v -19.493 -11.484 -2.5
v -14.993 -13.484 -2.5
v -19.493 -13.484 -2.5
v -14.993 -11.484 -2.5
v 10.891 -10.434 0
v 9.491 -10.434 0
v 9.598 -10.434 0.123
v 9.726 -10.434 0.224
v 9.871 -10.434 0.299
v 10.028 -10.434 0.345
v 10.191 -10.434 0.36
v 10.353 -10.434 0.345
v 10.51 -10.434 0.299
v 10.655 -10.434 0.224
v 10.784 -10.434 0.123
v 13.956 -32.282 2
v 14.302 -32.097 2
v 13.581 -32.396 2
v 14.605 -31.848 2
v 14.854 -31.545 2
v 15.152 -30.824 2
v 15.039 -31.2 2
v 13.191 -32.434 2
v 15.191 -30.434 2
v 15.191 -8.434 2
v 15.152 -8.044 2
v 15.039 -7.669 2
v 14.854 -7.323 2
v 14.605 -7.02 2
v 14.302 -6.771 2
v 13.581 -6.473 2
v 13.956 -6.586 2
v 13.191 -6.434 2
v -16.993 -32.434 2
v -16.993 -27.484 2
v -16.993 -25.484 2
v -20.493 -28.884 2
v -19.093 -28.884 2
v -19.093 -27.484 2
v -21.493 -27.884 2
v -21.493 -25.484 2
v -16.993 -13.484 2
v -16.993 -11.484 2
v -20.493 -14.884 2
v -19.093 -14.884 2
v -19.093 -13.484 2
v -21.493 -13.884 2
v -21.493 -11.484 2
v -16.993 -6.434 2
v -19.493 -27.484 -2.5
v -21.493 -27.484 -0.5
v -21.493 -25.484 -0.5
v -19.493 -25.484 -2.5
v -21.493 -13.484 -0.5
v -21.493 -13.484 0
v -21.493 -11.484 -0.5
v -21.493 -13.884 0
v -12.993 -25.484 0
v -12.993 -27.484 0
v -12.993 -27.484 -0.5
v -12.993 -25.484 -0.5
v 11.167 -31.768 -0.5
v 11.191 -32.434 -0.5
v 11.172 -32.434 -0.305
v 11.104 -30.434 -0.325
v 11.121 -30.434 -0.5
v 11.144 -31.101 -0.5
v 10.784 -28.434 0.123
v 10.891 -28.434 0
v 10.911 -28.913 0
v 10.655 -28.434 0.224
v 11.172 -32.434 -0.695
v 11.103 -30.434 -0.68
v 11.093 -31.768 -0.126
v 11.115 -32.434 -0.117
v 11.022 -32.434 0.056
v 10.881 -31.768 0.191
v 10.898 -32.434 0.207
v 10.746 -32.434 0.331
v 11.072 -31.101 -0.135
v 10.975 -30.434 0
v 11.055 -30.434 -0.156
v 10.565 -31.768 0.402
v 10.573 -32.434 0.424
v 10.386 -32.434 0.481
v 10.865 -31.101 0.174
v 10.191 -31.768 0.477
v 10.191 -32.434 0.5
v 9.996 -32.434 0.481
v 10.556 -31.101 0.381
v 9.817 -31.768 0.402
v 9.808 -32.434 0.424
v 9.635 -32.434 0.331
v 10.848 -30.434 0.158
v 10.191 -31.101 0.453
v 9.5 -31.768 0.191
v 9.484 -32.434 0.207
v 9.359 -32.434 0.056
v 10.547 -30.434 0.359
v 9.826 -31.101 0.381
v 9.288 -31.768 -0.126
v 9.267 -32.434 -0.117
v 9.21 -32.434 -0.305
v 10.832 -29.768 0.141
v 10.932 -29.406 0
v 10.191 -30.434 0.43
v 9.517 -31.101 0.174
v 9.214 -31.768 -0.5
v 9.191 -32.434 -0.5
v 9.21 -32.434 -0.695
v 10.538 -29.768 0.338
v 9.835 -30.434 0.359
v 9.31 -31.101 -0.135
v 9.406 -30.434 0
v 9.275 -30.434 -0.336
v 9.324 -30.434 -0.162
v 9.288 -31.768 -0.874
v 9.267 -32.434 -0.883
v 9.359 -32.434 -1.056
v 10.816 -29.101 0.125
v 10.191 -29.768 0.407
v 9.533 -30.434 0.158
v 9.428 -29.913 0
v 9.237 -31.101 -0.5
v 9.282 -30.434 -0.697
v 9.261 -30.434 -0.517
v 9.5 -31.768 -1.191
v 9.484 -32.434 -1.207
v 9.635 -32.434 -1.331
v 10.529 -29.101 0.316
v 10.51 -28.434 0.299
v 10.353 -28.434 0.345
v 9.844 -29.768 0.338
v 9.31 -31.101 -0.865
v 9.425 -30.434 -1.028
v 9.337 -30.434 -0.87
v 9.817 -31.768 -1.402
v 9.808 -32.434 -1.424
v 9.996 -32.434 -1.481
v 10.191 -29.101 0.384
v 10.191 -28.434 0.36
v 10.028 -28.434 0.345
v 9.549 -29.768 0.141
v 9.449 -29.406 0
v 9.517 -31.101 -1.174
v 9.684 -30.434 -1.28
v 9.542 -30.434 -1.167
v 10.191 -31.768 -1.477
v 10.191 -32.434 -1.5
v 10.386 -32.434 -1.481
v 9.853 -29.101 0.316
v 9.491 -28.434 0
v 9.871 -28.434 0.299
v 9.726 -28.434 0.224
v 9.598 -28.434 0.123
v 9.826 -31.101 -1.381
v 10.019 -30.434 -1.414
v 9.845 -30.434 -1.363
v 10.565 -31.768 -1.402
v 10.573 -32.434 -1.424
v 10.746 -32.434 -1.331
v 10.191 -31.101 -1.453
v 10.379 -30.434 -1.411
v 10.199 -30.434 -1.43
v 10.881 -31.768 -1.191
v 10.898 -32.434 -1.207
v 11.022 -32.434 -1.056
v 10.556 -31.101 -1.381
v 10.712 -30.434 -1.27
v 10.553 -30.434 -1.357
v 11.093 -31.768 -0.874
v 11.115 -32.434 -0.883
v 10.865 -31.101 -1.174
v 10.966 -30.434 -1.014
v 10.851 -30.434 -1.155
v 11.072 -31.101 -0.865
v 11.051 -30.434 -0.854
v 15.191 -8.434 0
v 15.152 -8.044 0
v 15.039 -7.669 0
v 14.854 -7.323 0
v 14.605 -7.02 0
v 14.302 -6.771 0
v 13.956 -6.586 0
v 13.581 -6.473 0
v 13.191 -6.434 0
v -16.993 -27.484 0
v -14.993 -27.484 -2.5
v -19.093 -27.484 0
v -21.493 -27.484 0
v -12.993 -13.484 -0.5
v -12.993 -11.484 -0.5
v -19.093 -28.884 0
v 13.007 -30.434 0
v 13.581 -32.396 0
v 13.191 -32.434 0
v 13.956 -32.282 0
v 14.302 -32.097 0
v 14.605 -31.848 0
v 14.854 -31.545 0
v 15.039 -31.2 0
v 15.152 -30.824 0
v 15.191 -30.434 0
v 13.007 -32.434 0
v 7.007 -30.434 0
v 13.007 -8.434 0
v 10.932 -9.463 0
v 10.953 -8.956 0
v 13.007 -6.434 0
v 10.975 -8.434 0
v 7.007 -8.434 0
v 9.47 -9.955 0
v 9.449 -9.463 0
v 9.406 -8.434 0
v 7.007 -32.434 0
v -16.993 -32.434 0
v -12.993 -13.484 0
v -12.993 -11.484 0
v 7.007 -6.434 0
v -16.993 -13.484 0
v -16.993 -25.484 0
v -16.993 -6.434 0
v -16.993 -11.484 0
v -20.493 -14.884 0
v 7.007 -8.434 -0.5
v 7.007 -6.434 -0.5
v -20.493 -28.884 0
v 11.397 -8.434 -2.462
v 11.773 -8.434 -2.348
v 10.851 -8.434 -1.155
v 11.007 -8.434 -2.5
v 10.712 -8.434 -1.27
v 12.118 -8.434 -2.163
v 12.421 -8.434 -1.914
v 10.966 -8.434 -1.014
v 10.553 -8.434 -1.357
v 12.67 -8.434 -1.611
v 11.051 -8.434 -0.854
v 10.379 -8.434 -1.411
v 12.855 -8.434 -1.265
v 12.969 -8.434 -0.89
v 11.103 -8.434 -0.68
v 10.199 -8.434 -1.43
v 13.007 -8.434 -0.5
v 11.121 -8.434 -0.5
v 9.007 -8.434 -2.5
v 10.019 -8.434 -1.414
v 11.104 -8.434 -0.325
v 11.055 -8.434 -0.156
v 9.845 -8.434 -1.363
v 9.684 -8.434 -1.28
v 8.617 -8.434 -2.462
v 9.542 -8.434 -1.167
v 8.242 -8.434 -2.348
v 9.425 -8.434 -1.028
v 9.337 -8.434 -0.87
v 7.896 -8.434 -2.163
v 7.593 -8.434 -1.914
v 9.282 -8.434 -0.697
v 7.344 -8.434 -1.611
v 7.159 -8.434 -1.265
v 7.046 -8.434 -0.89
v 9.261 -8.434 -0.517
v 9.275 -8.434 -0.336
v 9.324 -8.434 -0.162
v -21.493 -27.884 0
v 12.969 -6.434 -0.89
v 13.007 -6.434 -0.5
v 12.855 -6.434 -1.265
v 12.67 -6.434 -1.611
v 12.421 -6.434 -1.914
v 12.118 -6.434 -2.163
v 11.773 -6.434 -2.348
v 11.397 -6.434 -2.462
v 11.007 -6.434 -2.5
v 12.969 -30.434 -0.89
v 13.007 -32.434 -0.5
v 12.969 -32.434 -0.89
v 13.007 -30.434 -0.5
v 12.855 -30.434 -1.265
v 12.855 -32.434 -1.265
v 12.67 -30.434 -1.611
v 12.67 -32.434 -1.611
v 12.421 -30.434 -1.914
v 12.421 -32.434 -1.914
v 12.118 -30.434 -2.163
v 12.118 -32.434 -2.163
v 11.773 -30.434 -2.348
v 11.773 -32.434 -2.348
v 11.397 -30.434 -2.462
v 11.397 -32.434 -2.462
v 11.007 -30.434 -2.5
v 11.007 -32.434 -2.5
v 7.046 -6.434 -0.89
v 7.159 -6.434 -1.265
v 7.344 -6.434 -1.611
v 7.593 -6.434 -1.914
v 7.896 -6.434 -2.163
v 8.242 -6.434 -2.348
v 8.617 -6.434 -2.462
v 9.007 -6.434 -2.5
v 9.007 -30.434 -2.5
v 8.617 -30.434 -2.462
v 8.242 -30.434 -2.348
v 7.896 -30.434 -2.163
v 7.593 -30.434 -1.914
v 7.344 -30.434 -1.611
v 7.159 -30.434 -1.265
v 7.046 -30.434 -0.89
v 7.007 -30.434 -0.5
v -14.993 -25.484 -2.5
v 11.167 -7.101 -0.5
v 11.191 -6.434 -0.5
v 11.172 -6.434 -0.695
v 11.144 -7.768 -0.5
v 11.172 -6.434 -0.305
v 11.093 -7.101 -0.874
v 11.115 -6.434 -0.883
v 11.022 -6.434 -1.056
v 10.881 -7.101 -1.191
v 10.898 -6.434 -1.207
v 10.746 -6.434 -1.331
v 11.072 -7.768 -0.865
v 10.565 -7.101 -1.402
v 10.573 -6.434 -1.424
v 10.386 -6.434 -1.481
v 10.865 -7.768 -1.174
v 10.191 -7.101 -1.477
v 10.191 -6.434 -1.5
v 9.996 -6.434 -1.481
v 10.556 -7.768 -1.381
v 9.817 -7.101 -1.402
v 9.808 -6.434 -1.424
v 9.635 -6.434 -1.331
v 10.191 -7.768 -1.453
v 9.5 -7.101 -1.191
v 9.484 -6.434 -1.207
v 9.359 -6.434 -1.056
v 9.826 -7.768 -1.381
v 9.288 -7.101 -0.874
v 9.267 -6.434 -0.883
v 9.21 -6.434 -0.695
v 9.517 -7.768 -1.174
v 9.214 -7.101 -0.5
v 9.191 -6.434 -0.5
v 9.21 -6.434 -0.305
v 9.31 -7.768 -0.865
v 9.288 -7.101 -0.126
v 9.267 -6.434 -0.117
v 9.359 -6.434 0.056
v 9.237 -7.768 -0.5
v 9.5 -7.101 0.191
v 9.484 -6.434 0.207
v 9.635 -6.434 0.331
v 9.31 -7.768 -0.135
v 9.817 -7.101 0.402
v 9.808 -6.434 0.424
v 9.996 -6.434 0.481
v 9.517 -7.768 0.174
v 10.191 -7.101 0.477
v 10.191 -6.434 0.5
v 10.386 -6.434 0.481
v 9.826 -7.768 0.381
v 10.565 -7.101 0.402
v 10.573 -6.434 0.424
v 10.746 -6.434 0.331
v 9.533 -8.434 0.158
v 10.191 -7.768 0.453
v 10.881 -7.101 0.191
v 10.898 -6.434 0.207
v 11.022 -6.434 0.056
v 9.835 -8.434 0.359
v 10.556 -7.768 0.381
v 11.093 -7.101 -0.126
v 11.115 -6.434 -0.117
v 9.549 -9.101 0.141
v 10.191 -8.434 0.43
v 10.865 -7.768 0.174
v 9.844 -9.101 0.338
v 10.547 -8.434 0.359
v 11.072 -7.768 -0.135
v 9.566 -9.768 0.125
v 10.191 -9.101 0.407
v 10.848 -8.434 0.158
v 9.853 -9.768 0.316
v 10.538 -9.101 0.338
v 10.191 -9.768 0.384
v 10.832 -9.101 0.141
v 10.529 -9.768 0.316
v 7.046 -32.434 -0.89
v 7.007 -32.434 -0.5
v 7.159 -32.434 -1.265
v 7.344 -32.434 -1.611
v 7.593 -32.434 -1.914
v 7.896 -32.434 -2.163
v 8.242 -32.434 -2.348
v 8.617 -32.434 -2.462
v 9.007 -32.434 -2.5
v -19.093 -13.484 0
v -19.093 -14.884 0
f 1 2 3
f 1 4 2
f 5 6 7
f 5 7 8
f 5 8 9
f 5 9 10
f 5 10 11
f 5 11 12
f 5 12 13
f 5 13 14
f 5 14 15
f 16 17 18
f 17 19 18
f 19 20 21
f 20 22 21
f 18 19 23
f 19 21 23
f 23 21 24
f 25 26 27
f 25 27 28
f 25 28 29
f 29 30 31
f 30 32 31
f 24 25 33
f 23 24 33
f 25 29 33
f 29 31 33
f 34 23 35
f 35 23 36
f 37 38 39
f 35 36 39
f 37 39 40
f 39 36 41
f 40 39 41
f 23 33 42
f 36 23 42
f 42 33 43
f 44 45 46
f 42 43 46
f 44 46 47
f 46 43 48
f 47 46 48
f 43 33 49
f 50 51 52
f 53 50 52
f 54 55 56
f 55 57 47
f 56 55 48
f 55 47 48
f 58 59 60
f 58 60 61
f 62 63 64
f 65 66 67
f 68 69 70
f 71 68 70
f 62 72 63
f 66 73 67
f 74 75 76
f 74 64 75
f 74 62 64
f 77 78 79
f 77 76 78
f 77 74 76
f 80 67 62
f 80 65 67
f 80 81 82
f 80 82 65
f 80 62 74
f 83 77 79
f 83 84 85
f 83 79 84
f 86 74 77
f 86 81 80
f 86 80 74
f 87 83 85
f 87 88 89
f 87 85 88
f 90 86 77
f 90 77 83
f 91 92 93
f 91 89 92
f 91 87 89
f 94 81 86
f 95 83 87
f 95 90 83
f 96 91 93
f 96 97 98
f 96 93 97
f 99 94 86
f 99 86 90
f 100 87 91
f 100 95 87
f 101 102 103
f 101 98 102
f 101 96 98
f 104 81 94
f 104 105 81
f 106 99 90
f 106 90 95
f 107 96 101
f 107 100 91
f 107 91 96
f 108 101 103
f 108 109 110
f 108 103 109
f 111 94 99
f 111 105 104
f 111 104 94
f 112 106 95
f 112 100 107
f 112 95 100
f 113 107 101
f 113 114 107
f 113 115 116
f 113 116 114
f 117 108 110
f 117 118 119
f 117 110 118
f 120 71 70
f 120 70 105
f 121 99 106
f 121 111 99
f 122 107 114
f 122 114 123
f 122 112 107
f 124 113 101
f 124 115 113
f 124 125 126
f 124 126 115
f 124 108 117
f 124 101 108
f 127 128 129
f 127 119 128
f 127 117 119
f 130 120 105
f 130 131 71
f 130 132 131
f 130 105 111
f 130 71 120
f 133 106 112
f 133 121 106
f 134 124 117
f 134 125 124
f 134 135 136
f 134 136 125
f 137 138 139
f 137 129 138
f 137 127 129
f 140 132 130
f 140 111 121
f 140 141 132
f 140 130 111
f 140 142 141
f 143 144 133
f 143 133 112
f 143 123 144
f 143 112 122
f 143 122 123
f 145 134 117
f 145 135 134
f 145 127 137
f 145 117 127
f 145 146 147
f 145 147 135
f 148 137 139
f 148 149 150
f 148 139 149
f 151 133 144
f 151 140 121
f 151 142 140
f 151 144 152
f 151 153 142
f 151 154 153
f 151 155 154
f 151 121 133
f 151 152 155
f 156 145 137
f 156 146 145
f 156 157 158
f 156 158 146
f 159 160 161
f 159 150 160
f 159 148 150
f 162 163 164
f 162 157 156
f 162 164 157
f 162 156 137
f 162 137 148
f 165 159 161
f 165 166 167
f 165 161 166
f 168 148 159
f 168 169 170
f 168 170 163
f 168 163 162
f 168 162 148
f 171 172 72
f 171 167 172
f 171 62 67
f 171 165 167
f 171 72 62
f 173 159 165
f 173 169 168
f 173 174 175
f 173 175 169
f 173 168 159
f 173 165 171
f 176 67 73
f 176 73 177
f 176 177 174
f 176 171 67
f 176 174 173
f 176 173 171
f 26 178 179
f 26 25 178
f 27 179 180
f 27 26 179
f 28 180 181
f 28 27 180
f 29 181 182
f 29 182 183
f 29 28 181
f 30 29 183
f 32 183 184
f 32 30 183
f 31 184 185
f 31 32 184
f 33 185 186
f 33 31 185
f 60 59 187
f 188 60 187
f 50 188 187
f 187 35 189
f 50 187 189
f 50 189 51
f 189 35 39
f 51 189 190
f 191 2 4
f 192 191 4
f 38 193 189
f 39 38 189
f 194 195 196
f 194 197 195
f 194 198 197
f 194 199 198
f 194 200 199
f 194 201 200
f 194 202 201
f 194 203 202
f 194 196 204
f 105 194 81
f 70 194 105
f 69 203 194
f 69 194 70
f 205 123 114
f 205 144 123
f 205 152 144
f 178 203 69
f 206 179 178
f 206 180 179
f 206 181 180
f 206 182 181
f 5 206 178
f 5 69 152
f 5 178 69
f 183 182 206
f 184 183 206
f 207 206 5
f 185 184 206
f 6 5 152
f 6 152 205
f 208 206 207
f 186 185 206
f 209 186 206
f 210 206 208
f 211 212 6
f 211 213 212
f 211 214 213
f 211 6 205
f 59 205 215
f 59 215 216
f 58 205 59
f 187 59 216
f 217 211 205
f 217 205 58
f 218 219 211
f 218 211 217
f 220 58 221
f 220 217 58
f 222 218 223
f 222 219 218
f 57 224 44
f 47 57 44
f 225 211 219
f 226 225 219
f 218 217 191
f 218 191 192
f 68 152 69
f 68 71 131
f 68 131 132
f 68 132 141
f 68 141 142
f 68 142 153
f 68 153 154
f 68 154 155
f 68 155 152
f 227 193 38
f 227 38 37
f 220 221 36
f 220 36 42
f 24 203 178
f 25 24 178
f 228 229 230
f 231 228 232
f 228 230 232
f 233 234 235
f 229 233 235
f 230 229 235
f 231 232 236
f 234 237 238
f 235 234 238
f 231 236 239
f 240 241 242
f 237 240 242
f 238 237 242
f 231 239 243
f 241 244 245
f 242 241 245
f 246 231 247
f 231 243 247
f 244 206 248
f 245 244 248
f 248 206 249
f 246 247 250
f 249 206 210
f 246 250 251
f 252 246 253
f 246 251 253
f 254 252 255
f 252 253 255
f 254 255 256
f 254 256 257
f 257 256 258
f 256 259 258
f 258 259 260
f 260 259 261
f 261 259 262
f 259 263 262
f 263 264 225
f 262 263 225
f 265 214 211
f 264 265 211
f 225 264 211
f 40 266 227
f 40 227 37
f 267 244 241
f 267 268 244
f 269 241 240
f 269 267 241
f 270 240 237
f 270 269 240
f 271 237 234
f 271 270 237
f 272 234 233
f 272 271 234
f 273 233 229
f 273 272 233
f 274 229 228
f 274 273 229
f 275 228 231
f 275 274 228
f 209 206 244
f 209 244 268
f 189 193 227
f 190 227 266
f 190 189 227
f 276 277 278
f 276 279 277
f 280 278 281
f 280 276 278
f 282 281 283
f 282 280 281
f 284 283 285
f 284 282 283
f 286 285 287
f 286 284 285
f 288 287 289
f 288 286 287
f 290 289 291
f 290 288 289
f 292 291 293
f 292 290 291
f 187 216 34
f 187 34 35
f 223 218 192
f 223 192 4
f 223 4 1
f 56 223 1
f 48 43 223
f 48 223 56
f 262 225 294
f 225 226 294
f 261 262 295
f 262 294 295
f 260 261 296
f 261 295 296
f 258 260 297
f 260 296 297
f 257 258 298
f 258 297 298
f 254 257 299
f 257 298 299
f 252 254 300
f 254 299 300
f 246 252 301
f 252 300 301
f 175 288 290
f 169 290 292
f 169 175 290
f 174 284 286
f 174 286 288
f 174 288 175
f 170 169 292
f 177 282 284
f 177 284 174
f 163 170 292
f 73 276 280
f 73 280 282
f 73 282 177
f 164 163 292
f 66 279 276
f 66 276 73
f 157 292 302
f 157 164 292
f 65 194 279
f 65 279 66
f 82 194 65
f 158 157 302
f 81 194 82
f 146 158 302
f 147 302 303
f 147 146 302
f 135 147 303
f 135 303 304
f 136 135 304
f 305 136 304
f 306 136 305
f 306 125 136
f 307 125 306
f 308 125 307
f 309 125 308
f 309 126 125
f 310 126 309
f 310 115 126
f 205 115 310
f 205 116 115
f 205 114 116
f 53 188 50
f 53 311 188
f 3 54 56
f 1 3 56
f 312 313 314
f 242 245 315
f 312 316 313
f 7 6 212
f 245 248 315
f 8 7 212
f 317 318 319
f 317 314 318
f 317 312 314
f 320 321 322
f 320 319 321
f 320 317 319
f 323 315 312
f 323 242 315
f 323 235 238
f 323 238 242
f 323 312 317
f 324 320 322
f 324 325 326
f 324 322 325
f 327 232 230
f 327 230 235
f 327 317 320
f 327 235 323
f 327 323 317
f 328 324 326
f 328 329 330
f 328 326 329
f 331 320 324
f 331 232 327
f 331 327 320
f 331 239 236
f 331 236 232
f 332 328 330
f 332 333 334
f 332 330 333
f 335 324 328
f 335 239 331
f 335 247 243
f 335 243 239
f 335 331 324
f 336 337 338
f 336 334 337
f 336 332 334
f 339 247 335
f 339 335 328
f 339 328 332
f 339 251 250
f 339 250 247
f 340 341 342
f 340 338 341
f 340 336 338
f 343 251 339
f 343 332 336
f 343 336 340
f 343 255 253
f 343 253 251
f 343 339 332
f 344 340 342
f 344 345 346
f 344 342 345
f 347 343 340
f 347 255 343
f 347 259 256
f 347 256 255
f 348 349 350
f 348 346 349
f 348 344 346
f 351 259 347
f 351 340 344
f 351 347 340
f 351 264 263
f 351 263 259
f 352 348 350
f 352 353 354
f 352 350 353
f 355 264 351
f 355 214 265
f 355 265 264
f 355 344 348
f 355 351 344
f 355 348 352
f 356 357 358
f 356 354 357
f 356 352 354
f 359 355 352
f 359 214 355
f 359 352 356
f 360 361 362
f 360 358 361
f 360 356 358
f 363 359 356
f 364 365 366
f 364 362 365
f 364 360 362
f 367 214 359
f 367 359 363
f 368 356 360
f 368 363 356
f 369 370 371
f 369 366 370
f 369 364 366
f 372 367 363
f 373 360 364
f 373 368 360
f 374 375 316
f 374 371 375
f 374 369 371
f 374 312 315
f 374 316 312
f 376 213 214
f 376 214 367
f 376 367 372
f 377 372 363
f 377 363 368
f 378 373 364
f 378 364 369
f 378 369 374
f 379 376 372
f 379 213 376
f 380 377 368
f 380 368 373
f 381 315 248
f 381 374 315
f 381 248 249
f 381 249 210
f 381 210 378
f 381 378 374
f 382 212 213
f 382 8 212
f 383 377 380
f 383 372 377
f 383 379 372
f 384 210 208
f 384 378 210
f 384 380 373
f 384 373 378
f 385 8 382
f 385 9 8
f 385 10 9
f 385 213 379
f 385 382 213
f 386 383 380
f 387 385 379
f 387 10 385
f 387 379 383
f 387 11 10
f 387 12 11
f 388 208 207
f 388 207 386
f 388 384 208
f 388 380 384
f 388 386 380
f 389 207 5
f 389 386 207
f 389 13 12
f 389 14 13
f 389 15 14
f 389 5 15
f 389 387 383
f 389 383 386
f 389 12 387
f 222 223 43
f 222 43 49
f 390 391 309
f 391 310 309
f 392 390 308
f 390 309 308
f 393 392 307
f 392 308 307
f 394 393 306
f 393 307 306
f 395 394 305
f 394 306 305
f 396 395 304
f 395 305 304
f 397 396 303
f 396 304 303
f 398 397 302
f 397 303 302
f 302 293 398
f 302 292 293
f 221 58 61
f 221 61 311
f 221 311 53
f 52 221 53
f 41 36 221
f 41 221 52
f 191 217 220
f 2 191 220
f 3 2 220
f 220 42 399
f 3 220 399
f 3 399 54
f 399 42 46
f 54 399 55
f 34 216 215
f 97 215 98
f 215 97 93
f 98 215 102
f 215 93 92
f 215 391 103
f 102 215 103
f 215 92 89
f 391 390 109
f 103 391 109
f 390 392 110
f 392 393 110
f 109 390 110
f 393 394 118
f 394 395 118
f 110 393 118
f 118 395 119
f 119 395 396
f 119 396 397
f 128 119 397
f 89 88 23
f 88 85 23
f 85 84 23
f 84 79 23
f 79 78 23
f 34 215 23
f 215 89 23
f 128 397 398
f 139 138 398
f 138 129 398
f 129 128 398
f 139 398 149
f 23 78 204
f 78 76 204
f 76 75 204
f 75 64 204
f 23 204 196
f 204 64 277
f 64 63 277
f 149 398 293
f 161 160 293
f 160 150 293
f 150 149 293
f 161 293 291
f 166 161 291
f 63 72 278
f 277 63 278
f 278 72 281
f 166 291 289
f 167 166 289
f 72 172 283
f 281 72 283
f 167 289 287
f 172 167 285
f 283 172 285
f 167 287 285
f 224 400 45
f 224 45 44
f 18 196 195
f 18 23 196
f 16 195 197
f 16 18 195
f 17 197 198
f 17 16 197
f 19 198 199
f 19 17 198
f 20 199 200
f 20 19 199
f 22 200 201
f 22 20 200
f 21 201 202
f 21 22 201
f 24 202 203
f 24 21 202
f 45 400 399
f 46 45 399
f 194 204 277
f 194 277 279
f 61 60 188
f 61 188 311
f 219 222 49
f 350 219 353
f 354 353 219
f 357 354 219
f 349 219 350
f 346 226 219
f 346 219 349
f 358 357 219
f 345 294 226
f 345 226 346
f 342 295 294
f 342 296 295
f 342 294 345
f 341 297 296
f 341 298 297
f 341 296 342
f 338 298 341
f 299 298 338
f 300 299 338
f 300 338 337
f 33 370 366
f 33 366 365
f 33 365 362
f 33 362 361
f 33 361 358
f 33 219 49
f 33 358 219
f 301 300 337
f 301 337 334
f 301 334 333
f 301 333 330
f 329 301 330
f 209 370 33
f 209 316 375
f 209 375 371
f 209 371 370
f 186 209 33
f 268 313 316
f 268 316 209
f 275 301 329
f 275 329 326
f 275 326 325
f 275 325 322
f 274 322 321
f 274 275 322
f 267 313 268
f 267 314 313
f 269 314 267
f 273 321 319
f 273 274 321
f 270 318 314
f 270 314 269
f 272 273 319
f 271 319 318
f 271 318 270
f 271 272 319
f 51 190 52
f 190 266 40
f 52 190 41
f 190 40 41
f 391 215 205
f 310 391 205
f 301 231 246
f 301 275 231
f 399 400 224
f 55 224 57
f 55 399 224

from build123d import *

# Parameters (mm, degrees)
SKETCH_2_W          = 32.183544672
SKETCH_2_H          = 26
EXTRUDE_1_DEPTH     = 2
FILLET_1_R          = 2
SKETCH_5_W          = 6
SKETCH_5_H          = 2
EXTRUDE_2_DEPTH     = 2.5
FILLET_2_R          = 2
SKETCH_6_R          = 1
CUT_EXTRUDE_3_DEPTH = 4
CUT_EXTRUDE_3_TAPER = 2
SKETCH_7_R          = 1
CUT_EXTRUDE_4_DEPTH = 4
CUT_EXTRUDE_4_TAPER = 2
SKETCH_8_W          = 4.5
SKETCH_8_H          = 2
EXTRUDE_3_DEPTH     = 2
SKETCH_10_W         = 2.4
SKETCH_10_H         = 1.4
EXTRUDE_4_DEPTH     = 2
EXTRUDE_4_2_DEPTH   = 2
SKETCH_11_W         = 8.5
SKETCH_11_H         = 2
EXTRUDE_5_DEPTH     = 2.5
CHAMFER_1_SIZE      = 2
CHAMFER_2_SIZE      = 1


with BuildPart() as part:
    # 草图2 → 凸台-拉伸1 (new body)
    with BuildSketch(Plane.XY):
        with Locations((-0.901029093, -19.434236018)):
            Rectangle(SKETCH_2_W, SKETCH_2_H)
    extrude(amount=EXTRUDE_1_DEPTH)

    # 圆角1
    fillet_1_edges = [part.edges().sort_by_distance(p)[0] for p in [
        (15.190743243, -32.434236018, 1),
        (15.190743243, -6.434236018, 1),
    ]]
    fillet(fillet_1_edges, radius=FILLET_1_R)

    # 草图5 → 凸台-拉伸2 (add)
    with BuildSketch(Plane(origin=(0, 0, 0), x_dir=(-1, 0, 0), z_dir=(0, 0, -1))):
        with Locations((-10.007198571, -7.434236018)):
            Rectangle(SKETCH_5_W, SKETCH_5_H)
        with Locations((-10.007198571, -31.434236018)):
            Rectangle(SKETCH_5_W, SKETCH_5_H)
    extrude(amount=EXTRUDE_2_DEPTH)

    # 圆角2
    fillet_2_edges = [part.edges().sort_by_distance(p)[0] for p in [
        (13.007198571, -7.434236018, -2.5),
        (7.007198571, -7.434236018, -2.5),
        (13.007198571, -31.434236018, -2.5),
        (7.007198571, -31.434236018, -2.5),
    ]]
    fillet(fillet_2_edges, radius=FILLET_2_R)

    # 草图6 → 切除-拉伸3 (cut)
    with BuildSketch(Plane.XZ.offset(32.434236018)):
        with Locations((10.190743244, -0.5)):
            Circle(SKETCH_6_R)
    extrude(amount=-CUT_EXTRUDE_3_DEPTH, taper=CUT_EXTRUDE_3_TAPER, mode=Mode.SUBTRACT)

    # 草图7 → 切除-拉伸4 (cut)
    with BuildSketch(Plane(origin=(0, -6.434236018, 0), x_dir=(1, 0, 0), z_dir=(0, 1, 0))):
        with Locations((10.190743243, 0.5)):
            Circle(SKETCH_7_R)
    extrude(amount=-CUT_EXTRUDE_4_DEPTH, taper=CUT_EXTRUDE_4_TAPER, mode=Mode.SUBTRACT)

    # 草图8 → 凸台-拉伸3 (add)
    with BuildSketch(Plane(origin=(0, 0, 0), x_dir=(-1, 0, 0), z_dir=(0, 0, -1))):
        with Locations((19.242801429, -12.484236018)):
            Rectangle(SKETCH_8_W, SKETCH_8_H)
        with Locations((19.242801429, -26.484236018)):
            Rectangle(SKETCH_8_W, SKETCH_8_H)
    extrude(amount=-EXTRUDE_3_DEPTH)



with BuildPart() as body_2:
    # 草图10 → 凸台-拉伸4 (new body)
    with BuildSketch(Plane(origin=(0, 0, 0), x_dir=(-1, 0, 0), z_dir=(0, 0, -1))):
        with Locations((20.292801429, -14.184236018)):
            Rectangle(SKETCH_10_W, SKETCH_10_H)
    extrude(amount=-EXTRUDE_4_DEPTH)


with BuildPart() as body_3:
    # 草图10 → Extrude 4 2 (new body)
    with BuildSketch(Plane(origin=(0, 0, 0), x_dir=(-1, 0, 0), z_dir=(0, 0, -1))):
        with Locations((20.292801429, -28.184236018)):
            Rectangle(SKETCH_10_W, SKETCH_10_H)
    extrude(amount=-EXTRUDE_4_2_DEPTH)


with BuildPart() as part_1:
    add(part.part)

    add(body_2.part)  # 凸台-拉伸5 merges body 2

    add(body_3.part)  # 凸台-拉伸5 merges body 3
    # 草图11 → 凸台-拉伸5 (add)
    with BuildSketch(Plane(origin=(0, 0, 0), x_dir=(-1, 0, 0), z_dir=(0, 0, -1))):
        with Locations((17.242801429, -12.484236018)):
            Rectangle(SKETCH_11_W, SKETCH_11_H)
        with Locations((17.242801429, -26.484236018)):
            Rectangle(SKETCH_11_W, SKETCH_11_H)
    extrude(amount=EXTRUDE_5_DEPTH)

    # 倒角1
    chamfer_1_edges = [part_1.edges().sort_by_distance(p)[0] for p in [
        (-21.492801429, -12.484236018, -2.5),
        (-12.992801429, -12.484236018, -2.5),
        (-21.492801429, -26.484236018, -2.5),
        (-12.992801429, -26.484236018, -2.5),
    ]]
    chamfer(chamfer_1_edges, length=CHAMFER_1_SIZE)

    # 倒角2
    chamfer_2_edges = [part_1.edges().sort_by_distance(p)[0] for p in [
        (-21.492801429, -14.884236018, 1),
        (-21.492801429, -28.884236018, 1),
    ]]
    chamfer(chamfer_2_edges, length=CHAMFER_2_SIZE)


solid = part_1.part
